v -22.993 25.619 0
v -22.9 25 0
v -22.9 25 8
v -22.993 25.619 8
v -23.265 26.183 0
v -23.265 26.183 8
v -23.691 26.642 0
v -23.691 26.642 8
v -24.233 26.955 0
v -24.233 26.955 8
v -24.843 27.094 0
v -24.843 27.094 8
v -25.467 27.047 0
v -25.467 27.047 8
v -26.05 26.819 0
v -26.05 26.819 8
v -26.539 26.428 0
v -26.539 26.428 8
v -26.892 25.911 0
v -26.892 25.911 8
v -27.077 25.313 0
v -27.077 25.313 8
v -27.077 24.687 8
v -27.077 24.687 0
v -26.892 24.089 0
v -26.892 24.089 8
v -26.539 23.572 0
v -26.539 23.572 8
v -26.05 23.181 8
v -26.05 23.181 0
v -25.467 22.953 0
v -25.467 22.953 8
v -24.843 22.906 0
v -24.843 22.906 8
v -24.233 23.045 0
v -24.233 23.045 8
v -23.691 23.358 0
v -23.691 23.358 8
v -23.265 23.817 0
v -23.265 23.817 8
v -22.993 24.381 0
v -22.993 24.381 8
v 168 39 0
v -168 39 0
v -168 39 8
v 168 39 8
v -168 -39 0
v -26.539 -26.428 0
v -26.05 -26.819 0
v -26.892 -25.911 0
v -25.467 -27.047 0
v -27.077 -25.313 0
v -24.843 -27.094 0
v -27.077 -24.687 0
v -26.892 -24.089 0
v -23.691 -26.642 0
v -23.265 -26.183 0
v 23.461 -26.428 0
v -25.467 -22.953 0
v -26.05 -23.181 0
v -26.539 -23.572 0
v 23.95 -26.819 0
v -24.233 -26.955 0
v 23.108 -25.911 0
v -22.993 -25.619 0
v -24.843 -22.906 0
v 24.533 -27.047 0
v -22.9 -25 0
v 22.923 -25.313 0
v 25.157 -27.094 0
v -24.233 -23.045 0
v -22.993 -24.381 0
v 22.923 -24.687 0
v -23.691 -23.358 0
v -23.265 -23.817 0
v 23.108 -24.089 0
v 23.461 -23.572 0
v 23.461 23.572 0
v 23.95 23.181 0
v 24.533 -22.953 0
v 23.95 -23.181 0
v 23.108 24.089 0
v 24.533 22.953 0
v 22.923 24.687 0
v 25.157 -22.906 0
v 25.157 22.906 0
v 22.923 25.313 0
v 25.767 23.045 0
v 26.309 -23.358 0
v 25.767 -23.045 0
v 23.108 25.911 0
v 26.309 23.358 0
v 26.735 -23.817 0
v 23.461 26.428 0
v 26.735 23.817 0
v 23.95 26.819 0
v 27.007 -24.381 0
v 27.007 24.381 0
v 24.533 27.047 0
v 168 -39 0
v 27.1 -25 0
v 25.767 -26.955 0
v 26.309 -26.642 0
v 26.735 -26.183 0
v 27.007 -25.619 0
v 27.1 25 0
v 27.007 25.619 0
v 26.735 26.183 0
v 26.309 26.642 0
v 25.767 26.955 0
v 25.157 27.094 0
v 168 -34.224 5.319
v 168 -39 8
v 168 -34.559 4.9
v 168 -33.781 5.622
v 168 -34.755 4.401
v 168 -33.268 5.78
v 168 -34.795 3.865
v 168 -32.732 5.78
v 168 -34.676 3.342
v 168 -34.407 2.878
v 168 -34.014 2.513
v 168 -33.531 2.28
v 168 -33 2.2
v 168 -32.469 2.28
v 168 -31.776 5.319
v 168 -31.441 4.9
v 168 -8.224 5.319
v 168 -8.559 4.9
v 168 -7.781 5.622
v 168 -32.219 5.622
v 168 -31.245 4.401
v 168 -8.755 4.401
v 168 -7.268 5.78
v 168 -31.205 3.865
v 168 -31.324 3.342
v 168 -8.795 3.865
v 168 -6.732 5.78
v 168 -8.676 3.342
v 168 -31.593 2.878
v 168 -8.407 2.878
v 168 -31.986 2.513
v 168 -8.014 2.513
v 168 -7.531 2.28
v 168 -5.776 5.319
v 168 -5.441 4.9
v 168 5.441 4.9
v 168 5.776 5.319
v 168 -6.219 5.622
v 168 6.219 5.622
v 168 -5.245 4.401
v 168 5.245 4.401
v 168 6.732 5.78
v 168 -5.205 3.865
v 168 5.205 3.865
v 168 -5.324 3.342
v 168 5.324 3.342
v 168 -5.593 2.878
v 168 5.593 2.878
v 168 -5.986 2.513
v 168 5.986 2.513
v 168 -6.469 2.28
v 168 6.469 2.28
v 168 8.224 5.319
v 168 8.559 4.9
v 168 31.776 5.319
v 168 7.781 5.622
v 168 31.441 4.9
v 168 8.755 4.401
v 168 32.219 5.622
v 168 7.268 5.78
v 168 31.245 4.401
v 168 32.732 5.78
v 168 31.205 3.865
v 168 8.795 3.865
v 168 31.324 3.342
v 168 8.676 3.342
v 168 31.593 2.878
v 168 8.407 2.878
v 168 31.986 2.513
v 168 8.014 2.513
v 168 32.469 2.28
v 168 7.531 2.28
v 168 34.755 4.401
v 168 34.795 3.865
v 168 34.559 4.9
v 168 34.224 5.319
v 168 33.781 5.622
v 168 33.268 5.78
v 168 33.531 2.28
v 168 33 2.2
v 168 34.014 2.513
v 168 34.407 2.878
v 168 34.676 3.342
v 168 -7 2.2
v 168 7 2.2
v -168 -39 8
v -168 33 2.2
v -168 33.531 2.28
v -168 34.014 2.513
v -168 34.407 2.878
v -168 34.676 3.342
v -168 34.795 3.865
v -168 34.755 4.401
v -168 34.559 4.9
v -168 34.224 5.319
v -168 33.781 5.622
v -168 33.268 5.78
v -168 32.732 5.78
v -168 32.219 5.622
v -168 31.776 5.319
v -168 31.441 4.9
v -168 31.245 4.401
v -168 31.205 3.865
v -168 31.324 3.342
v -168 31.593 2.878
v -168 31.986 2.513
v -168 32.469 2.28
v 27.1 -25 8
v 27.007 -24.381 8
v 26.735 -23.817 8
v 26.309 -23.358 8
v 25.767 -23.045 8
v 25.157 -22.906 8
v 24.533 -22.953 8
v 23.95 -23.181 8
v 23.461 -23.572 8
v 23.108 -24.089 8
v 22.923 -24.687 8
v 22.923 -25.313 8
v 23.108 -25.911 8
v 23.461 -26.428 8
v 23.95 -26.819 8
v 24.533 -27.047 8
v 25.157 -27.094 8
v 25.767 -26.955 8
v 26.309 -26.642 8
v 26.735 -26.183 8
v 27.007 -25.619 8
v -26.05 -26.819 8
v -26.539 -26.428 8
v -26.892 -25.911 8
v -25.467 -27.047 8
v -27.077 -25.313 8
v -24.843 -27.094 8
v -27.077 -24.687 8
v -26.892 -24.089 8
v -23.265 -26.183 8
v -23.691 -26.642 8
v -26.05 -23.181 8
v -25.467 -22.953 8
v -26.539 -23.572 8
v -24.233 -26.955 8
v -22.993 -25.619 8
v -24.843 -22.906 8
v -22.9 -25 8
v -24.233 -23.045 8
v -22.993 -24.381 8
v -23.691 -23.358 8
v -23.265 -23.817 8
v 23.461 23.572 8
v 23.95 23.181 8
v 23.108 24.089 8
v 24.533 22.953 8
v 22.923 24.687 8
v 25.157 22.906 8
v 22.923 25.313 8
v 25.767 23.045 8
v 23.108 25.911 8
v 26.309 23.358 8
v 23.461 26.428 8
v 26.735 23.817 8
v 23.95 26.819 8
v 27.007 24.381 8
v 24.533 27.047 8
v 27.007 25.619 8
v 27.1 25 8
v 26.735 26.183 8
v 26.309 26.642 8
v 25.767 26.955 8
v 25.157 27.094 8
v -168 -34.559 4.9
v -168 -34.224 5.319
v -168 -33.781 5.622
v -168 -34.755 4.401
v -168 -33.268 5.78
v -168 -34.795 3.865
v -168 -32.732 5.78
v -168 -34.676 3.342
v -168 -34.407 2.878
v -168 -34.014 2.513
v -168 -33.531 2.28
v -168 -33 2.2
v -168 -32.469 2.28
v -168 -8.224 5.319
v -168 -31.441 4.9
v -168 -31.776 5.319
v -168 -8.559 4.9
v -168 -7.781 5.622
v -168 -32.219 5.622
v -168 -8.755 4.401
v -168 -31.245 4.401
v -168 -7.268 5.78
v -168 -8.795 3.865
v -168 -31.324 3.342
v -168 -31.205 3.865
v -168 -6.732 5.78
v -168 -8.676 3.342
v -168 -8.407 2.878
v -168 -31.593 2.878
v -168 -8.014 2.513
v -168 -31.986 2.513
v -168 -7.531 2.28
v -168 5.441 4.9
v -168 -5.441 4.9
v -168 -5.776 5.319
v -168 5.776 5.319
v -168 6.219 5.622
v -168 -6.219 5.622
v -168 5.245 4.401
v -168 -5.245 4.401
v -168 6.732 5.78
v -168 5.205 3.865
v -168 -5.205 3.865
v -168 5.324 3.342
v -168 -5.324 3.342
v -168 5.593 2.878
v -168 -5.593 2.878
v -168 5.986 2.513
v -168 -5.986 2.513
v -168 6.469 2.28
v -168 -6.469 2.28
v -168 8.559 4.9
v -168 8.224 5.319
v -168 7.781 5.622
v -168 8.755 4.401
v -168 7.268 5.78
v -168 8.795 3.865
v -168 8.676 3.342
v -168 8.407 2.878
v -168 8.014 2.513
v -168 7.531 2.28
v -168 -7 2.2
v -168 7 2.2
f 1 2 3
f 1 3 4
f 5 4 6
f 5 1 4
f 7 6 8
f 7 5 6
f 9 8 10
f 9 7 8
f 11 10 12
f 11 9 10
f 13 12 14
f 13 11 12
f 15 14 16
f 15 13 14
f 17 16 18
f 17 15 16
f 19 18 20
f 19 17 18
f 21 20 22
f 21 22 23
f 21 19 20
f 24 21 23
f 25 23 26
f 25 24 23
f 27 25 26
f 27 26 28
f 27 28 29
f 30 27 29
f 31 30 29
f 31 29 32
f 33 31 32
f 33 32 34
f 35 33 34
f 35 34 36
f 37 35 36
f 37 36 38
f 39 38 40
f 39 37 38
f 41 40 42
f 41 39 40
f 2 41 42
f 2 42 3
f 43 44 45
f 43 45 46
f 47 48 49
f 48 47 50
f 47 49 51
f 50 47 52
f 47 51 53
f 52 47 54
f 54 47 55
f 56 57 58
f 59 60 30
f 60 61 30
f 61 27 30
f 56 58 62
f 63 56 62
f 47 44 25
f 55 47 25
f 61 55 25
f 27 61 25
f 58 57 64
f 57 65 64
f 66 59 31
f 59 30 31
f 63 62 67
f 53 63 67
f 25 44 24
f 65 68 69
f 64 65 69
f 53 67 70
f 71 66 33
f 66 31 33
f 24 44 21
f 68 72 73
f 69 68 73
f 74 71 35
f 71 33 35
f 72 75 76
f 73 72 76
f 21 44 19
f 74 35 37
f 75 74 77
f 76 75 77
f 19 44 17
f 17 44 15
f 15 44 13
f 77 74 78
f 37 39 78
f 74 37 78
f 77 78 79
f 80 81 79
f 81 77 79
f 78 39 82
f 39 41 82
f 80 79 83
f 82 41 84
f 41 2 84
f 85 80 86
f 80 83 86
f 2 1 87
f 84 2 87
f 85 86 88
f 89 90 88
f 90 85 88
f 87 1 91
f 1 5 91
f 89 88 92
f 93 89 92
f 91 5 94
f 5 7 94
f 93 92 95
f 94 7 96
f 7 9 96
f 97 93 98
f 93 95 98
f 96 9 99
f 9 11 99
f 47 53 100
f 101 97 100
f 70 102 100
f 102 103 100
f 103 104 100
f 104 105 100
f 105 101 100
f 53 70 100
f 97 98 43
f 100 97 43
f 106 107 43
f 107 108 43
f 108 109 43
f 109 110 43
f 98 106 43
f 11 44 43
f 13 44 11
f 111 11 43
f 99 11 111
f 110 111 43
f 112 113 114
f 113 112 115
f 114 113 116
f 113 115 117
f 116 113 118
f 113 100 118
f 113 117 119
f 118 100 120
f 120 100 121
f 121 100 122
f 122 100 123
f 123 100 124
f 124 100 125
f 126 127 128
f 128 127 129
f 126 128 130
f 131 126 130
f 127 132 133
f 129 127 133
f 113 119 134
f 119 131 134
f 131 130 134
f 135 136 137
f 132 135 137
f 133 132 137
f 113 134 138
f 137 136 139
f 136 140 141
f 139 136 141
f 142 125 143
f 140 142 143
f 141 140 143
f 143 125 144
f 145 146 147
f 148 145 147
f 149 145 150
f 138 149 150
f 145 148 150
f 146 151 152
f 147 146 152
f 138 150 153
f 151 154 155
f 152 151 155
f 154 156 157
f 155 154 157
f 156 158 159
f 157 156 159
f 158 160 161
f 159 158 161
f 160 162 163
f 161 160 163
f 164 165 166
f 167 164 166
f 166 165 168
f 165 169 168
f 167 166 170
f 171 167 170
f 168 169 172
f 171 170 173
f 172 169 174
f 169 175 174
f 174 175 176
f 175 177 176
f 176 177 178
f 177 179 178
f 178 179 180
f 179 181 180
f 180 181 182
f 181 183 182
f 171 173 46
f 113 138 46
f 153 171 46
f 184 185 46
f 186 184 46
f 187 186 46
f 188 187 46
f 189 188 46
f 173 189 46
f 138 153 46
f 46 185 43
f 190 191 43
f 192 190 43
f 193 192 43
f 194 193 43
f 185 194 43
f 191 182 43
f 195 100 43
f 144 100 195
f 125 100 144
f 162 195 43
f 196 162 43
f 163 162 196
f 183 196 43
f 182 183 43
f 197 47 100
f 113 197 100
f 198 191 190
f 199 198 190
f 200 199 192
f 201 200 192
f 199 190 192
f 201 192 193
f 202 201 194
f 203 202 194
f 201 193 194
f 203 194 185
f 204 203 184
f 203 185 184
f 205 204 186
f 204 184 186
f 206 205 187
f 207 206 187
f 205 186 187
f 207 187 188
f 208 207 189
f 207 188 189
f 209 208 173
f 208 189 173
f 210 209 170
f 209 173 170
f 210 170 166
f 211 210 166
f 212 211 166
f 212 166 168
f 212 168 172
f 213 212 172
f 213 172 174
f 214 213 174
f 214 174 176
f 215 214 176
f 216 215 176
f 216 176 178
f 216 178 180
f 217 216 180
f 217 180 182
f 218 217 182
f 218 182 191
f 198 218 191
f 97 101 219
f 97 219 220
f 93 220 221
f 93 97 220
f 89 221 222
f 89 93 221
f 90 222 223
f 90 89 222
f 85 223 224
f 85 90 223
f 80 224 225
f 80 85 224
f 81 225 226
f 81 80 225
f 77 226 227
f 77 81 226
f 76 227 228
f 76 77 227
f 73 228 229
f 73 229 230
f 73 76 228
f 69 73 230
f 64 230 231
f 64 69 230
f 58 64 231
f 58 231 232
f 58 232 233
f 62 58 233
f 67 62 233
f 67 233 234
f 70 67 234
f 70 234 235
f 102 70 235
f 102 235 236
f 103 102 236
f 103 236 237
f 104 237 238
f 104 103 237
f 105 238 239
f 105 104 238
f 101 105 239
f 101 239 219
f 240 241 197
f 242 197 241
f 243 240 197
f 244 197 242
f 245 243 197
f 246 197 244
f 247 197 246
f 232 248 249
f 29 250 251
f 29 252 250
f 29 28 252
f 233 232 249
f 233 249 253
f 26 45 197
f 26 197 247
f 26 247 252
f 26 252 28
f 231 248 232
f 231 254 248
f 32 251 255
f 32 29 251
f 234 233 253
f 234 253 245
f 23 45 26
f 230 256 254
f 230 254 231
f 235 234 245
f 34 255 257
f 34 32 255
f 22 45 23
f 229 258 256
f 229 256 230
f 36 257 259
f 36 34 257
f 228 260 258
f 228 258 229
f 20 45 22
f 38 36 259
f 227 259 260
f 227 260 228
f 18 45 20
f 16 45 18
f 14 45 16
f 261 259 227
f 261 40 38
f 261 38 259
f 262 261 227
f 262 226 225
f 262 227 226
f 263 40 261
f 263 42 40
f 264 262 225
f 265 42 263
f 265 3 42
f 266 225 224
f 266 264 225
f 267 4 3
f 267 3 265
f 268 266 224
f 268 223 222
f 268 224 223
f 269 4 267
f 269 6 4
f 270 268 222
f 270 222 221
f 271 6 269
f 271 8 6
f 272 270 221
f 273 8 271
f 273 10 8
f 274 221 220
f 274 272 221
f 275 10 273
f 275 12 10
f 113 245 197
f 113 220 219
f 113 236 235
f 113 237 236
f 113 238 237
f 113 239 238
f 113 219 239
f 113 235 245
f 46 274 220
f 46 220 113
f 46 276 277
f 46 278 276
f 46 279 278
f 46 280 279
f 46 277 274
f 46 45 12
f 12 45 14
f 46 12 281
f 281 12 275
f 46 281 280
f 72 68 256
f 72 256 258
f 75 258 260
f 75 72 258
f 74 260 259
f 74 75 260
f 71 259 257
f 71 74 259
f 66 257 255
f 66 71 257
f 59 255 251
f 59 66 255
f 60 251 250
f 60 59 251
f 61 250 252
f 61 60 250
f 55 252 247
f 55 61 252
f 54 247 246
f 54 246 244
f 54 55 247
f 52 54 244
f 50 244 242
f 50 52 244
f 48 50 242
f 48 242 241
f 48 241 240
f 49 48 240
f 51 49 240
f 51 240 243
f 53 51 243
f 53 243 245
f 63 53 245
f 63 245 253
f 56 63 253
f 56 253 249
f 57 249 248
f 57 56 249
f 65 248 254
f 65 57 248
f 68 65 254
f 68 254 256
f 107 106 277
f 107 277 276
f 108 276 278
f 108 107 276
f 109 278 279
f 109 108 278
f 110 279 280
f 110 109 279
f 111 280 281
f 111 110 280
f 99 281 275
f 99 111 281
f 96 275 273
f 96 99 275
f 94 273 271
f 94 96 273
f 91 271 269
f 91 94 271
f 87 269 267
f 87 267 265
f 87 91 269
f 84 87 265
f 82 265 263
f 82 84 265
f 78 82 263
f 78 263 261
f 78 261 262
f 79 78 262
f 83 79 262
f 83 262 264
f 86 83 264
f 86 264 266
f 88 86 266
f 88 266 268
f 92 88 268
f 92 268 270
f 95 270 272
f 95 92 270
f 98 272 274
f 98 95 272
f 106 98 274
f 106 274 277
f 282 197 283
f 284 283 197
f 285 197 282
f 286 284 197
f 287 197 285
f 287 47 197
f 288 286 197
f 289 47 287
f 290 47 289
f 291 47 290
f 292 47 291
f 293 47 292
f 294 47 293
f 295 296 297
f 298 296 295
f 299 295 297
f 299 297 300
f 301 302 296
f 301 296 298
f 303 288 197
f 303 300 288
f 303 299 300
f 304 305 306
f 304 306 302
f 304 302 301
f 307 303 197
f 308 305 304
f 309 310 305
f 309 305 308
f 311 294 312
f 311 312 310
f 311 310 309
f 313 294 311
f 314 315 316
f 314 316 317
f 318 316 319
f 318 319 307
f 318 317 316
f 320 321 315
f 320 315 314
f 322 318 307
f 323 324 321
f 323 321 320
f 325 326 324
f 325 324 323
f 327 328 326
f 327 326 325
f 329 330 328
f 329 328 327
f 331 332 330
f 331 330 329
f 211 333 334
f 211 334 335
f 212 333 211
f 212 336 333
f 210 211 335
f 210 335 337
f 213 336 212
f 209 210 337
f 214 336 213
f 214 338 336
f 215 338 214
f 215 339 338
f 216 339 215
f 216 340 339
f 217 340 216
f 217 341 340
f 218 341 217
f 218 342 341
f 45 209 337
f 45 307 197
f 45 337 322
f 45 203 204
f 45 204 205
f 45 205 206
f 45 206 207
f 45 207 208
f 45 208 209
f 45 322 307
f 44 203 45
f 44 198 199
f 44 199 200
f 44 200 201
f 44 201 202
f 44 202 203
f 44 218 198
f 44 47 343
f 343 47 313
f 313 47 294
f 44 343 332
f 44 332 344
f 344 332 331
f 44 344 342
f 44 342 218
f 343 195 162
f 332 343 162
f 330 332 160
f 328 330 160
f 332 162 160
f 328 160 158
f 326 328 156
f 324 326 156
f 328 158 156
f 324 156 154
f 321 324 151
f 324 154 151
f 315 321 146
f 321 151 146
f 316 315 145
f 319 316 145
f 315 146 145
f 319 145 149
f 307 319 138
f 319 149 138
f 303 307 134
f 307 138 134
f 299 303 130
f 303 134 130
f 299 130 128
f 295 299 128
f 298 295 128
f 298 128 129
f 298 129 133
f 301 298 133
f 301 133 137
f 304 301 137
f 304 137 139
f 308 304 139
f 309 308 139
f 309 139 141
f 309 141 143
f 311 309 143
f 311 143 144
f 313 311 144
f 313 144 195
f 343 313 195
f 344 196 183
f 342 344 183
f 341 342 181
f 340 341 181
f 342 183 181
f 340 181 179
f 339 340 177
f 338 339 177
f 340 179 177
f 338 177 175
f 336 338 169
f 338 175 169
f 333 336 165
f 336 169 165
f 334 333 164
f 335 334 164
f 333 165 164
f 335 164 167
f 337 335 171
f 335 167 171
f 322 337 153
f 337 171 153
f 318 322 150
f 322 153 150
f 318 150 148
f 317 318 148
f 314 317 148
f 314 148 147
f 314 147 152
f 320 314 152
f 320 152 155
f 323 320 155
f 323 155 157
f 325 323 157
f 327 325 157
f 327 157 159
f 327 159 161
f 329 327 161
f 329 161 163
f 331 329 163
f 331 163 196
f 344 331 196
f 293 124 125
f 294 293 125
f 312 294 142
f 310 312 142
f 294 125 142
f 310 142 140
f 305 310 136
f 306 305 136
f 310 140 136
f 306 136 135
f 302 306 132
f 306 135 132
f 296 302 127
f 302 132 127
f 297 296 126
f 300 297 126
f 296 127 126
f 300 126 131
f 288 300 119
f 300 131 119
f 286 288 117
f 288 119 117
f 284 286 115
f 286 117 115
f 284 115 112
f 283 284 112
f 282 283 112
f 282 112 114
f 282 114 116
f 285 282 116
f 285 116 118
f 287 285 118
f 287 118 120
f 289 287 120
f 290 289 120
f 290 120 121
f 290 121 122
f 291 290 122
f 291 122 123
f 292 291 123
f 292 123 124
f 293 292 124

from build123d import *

# Parameters (mm, degrees)
SKETCH1_W           = 336
SKETCH1_H           = 78
SKETCH1_R           = 2.1
BOSS_EXTRUDE1_DEPTH = 8
CUT_EXTRUDE1_REACH  = 338
SKETCH2_R           = 1.8


with BuildPart() as part:
    # Sketch1 → Boss-Extrude1 (new body)
    with BuildSketch(Plane.XY):
        Rectangle(SKETCH1_W, SKETCH1_H)
        with Locations((-25, 25)):
            Circle(SKETCH1_R, mode=Mode.SUBTRACT)
        with Locations((25, 25)):
            Circle(SKETCH1_R, mode=Mode.SUBTRACT)
        with Locations((25, -25)):
            Circle(SKETCH1_R, mode=Mode.SUBTRACT)
        with Locations((-25, -25)):
            Circle(SKETCH1_R, mode=Mode.SUBTRACT)
    extrude(amount=BOSS_EXTRUDE1_DEPTH)

    # Sketch2 → Cut-Extrude1 (cut, up to next)
    with BuildSketch(Plane(origin=(168, 0, 0), x_dir=(0, 0, -1), z_dir=(1, 0, 0)), mode=Mode.PRIVATE) as cut_extrude1_sk1:
        with Locations((-4, 33)):
            Circle(SKETCH2_R)
    cut_extrude1_tool1 = extrude(cut_extrude1_sk1.sketch, amount=-CUT_EXTRUDE1_REACH, mode=Mode.PRIVATE) & part.part
    add(cut_extrude1_tool1.solids().sort_by_distance((168, 33, 4))[0], mode=Mode.SUBTRACT)
    # Sketch2 → Cut-Extrude1 (cut, up to next)
    with BuildSketch(Plane(origin=(168, 0, 0), x_dir=(0, 0, -1), z_dir=(1, 0, 0)), mode=Mode.PRIVATE) as cut_extrude1_sk2:
        with Locations((-4, 7)):
            Circle(SKETCH2_R)
    cut_extrude1_tool2 = extrude(cut_extrude1_sk2.sketch, amount=-CUT_EXTRUDE1_REACH, mode=Mode.PRIVATE) & part.part
    add(cut_extrude1_tool2.solids().sort_by_distance((168, 7, 4))[0], mode=Mode.SUBTRACT)
    # Sketch2 → Cut-Extrude1 (cut, up to next)
    with BuildSketch(Plane(origin=(168, 0, 0), x_dir=(0, 0, -1), z_dir=(1, 0, 0)), mode=Mode.PRIVATE) as cut_extrude1_sk3:
        with Locations((-4, -7)):
            Circle(SKETCH2_R)
    cut_extrude1_tool3 = extrude(cut_extrude1_sk3.sketch, amount=-CUT_EXTRUDE1_REACH, mode=Mode.PRIVATE) & part.part
    add(cut_extrude1_tool3.solids().sort_by_distance((168, -7, 4))[0], mode=Mode.SUBTRACT)
    # Sketch2 → Cut-Extrude1 (cut, up to next)
    with BuildSketch(Plane(origin=(168, 0, 0), x_dir=(0, 0, -1), z_dir=(1, 0, 0)), mode=Mode.PRIVATE) as cut_extrude1_sk4:
        with Locations((-4, -33)):
            Circle(SKETCH2_R)
    cut_extrude1_tool4 = extrude(cut_extrude1_sk4.sketch, amount=-CUT_EXTRUDE1_REACH, mode=Mode.PRIVATE) & part.part
    add(cut_extrude1_tool4.solids().sort_by_distance((168, -33, 4))[0], mode=Mode.SUBTRACT)


solid = part.part
